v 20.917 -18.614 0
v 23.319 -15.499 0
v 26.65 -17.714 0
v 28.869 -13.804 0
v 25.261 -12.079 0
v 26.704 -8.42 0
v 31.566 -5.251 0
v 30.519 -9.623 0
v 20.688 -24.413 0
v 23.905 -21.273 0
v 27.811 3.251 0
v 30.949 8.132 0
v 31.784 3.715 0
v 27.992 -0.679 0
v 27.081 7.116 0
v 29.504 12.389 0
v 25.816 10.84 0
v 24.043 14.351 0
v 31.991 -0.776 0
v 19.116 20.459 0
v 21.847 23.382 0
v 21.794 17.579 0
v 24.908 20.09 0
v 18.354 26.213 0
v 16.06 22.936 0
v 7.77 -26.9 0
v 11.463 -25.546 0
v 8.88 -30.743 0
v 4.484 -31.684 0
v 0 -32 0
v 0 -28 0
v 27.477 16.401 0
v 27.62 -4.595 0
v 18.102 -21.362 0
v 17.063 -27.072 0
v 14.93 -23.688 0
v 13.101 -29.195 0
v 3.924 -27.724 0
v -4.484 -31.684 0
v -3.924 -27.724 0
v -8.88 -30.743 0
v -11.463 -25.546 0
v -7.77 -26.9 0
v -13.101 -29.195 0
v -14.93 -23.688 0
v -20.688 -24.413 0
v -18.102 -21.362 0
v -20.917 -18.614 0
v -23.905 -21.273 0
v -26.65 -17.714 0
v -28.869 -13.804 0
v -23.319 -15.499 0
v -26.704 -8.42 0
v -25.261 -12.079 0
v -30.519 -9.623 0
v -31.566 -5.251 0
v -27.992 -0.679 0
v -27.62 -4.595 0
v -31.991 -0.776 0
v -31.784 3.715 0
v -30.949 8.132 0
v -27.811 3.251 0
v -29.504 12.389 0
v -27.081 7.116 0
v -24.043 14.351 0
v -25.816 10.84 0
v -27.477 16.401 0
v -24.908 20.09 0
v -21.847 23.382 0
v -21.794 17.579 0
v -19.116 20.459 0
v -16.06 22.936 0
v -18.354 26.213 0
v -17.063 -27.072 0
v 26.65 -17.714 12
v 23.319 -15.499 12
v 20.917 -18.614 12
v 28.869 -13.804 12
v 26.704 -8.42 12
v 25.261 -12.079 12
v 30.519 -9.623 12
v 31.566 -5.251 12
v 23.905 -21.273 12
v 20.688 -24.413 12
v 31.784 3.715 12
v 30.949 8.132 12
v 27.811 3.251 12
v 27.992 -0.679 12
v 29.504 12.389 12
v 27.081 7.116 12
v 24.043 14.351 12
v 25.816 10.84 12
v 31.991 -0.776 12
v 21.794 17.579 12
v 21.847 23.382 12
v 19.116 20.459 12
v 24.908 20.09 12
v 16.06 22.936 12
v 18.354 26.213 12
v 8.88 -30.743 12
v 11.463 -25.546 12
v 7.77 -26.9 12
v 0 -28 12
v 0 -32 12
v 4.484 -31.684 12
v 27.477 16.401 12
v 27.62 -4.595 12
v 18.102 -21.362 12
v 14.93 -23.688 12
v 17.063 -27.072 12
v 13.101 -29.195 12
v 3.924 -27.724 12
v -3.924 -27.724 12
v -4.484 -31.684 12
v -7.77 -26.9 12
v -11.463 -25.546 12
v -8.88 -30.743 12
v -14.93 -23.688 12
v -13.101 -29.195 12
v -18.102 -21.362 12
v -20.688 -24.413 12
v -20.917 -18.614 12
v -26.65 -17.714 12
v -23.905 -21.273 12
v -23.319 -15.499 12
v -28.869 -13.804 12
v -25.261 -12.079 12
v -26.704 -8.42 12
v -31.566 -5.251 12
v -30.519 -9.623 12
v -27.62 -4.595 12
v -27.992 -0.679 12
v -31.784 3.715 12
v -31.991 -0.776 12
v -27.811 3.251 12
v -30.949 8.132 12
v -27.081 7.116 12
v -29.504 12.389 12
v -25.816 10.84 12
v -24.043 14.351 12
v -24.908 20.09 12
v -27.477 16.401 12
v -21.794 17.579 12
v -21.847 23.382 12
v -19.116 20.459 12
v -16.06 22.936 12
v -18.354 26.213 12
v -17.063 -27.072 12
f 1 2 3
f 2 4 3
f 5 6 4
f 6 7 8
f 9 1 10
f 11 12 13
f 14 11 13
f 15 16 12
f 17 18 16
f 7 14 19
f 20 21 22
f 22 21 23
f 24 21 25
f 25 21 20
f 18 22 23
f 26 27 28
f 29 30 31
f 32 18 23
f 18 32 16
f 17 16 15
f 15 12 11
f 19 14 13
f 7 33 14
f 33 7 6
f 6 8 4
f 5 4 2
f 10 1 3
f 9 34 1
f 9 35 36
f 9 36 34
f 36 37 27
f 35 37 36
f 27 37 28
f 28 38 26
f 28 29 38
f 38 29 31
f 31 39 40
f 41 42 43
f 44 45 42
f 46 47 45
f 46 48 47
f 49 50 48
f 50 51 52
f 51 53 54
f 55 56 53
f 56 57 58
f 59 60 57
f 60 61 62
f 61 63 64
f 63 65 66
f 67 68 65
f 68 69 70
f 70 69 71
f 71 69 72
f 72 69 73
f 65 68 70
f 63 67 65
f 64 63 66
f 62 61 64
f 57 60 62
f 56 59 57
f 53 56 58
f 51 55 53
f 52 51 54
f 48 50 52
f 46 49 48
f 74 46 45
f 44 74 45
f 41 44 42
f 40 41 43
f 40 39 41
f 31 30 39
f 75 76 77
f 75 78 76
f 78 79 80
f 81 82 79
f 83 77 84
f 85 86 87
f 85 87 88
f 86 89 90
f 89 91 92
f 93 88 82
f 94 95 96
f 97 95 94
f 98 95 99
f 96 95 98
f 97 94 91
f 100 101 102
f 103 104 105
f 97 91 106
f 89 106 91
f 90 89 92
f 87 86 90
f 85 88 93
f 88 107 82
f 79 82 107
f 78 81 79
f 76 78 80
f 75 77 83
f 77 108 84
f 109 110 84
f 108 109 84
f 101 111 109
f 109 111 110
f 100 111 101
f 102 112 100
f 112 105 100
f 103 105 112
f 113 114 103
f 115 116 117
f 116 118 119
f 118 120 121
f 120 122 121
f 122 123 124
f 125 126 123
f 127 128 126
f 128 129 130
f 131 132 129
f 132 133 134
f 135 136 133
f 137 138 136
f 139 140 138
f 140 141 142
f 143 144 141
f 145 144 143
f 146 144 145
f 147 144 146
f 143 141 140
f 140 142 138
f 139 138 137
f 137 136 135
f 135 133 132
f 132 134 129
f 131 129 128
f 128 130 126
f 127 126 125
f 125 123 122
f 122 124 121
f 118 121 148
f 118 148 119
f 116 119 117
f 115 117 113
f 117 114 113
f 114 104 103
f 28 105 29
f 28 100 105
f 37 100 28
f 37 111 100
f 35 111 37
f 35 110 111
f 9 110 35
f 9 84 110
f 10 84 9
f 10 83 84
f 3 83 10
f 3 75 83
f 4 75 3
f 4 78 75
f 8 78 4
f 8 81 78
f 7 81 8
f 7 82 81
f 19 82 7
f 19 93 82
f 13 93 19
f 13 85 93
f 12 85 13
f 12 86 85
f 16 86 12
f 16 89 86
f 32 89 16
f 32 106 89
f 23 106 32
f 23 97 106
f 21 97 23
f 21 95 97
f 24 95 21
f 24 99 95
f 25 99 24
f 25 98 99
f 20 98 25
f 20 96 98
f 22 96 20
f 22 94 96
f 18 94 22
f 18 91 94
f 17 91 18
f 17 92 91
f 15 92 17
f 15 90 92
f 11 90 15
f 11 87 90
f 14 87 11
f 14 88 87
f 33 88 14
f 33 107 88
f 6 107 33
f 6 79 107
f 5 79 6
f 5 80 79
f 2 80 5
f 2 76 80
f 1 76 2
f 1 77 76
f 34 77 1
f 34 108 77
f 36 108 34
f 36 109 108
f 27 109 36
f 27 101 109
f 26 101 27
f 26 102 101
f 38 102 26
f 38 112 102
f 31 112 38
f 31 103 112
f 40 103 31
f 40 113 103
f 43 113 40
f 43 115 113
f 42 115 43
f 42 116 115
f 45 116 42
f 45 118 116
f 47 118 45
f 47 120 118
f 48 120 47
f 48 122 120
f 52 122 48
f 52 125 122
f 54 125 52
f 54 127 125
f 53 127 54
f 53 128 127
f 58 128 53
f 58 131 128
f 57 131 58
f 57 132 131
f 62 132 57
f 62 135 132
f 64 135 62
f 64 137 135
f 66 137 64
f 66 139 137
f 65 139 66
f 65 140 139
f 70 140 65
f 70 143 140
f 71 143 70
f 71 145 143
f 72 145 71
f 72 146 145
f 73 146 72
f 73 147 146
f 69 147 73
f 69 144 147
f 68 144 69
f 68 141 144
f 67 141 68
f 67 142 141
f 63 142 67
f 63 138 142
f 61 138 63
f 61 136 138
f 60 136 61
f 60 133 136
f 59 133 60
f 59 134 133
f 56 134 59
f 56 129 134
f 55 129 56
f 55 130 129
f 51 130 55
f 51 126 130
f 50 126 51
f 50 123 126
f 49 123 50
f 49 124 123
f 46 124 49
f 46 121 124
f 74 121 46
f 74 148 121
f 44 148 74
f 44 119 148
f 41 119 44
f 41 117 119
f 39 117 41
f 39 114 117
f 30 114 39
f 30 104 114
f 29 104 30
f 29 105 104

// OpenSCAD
$fn = 32;

// ----------------------------------------------------------------------
// Spring clip: 64 mm outside, 4 mm band, 70 degree opening
// ----------------------------------------------------------------------

// --- parameters (mm) ---
outer_r = 32;             // clip outside radius
inner_r = 28;             // clip bore radius
band = 4;                 // band thickness
clip_w = 12;              // clip width
opening = 70;             // opening angle

clip_profile = [[-18.354, 26.213], [-21.847, 23.382], [-24.908, 20.09], [-27.477, 16.401], [-29.504, 12.389], [-30.949, 8.132], [-31.784, 3.715], [-31.991, -0.776], [-31.566, -5.251], [-30.519, -9.623], [-28.869, -13.804], [-26.65, -17.714], [-23.905, -21.273], [-20.688, -24.413], [-17.063, -27.072], [-13.101, -29.195], [-8.88, -30.743], [-4.484, -31.684], [0, -32], [4.484, -31.684], [8.88, -30.743], [13.101, -29.195], [17.063, -27.072], [20.688, -24.413], [23.905, -21.273], [26.65, -17.714], [28.869, -13.804], [30.519, -9.623], [31.566, -5.251], [31.991, -0.776], [31.784, 3.715], [30.949, 8.132], [29.504, 12.389], [27.477, 16.401], [24.908, 20.09], [21.847, 23.382], [18.354, 26.213], [16.06, 22.936], [19.116, 20.459], [21.794, 17.579], [24.043, 14.351], [25.816, 10.84], [27.081, 7.116], [27.811, 3.251], [27.992, -0.679], [27.62, -4.595], [26.704, -8.42], [25.261, -12.079], [23.319, -15.499], [20.917, -18.614], [18.102, -21.362], [14.93, -23.688], [11.463, -25.546], [7.77, -26.9], [3.924, -27.724], [0, -28], [-3.924, -27.724], [-7.77, -26.9], [-11.463, -25.546], [-14.93, -23.688], [-18.102, -21.362], [-20.917, -18.614], [-23.319, -15.499], [-25.261, -12.079], [-26.704, -8.42], [-27.62, -4.595], [-27.992, -0.679], [-27.811, 3.251], [-27.081, 7.116], [-25.816, 10.84], [-24.043, 14.351], [-21.794, 17.579], [-19.116, 20.459], [-16.06, 22.936]];

difference() {
  union() {
    linear_extrude(height = clip_w) polygon(clip_profile);
  }
}
